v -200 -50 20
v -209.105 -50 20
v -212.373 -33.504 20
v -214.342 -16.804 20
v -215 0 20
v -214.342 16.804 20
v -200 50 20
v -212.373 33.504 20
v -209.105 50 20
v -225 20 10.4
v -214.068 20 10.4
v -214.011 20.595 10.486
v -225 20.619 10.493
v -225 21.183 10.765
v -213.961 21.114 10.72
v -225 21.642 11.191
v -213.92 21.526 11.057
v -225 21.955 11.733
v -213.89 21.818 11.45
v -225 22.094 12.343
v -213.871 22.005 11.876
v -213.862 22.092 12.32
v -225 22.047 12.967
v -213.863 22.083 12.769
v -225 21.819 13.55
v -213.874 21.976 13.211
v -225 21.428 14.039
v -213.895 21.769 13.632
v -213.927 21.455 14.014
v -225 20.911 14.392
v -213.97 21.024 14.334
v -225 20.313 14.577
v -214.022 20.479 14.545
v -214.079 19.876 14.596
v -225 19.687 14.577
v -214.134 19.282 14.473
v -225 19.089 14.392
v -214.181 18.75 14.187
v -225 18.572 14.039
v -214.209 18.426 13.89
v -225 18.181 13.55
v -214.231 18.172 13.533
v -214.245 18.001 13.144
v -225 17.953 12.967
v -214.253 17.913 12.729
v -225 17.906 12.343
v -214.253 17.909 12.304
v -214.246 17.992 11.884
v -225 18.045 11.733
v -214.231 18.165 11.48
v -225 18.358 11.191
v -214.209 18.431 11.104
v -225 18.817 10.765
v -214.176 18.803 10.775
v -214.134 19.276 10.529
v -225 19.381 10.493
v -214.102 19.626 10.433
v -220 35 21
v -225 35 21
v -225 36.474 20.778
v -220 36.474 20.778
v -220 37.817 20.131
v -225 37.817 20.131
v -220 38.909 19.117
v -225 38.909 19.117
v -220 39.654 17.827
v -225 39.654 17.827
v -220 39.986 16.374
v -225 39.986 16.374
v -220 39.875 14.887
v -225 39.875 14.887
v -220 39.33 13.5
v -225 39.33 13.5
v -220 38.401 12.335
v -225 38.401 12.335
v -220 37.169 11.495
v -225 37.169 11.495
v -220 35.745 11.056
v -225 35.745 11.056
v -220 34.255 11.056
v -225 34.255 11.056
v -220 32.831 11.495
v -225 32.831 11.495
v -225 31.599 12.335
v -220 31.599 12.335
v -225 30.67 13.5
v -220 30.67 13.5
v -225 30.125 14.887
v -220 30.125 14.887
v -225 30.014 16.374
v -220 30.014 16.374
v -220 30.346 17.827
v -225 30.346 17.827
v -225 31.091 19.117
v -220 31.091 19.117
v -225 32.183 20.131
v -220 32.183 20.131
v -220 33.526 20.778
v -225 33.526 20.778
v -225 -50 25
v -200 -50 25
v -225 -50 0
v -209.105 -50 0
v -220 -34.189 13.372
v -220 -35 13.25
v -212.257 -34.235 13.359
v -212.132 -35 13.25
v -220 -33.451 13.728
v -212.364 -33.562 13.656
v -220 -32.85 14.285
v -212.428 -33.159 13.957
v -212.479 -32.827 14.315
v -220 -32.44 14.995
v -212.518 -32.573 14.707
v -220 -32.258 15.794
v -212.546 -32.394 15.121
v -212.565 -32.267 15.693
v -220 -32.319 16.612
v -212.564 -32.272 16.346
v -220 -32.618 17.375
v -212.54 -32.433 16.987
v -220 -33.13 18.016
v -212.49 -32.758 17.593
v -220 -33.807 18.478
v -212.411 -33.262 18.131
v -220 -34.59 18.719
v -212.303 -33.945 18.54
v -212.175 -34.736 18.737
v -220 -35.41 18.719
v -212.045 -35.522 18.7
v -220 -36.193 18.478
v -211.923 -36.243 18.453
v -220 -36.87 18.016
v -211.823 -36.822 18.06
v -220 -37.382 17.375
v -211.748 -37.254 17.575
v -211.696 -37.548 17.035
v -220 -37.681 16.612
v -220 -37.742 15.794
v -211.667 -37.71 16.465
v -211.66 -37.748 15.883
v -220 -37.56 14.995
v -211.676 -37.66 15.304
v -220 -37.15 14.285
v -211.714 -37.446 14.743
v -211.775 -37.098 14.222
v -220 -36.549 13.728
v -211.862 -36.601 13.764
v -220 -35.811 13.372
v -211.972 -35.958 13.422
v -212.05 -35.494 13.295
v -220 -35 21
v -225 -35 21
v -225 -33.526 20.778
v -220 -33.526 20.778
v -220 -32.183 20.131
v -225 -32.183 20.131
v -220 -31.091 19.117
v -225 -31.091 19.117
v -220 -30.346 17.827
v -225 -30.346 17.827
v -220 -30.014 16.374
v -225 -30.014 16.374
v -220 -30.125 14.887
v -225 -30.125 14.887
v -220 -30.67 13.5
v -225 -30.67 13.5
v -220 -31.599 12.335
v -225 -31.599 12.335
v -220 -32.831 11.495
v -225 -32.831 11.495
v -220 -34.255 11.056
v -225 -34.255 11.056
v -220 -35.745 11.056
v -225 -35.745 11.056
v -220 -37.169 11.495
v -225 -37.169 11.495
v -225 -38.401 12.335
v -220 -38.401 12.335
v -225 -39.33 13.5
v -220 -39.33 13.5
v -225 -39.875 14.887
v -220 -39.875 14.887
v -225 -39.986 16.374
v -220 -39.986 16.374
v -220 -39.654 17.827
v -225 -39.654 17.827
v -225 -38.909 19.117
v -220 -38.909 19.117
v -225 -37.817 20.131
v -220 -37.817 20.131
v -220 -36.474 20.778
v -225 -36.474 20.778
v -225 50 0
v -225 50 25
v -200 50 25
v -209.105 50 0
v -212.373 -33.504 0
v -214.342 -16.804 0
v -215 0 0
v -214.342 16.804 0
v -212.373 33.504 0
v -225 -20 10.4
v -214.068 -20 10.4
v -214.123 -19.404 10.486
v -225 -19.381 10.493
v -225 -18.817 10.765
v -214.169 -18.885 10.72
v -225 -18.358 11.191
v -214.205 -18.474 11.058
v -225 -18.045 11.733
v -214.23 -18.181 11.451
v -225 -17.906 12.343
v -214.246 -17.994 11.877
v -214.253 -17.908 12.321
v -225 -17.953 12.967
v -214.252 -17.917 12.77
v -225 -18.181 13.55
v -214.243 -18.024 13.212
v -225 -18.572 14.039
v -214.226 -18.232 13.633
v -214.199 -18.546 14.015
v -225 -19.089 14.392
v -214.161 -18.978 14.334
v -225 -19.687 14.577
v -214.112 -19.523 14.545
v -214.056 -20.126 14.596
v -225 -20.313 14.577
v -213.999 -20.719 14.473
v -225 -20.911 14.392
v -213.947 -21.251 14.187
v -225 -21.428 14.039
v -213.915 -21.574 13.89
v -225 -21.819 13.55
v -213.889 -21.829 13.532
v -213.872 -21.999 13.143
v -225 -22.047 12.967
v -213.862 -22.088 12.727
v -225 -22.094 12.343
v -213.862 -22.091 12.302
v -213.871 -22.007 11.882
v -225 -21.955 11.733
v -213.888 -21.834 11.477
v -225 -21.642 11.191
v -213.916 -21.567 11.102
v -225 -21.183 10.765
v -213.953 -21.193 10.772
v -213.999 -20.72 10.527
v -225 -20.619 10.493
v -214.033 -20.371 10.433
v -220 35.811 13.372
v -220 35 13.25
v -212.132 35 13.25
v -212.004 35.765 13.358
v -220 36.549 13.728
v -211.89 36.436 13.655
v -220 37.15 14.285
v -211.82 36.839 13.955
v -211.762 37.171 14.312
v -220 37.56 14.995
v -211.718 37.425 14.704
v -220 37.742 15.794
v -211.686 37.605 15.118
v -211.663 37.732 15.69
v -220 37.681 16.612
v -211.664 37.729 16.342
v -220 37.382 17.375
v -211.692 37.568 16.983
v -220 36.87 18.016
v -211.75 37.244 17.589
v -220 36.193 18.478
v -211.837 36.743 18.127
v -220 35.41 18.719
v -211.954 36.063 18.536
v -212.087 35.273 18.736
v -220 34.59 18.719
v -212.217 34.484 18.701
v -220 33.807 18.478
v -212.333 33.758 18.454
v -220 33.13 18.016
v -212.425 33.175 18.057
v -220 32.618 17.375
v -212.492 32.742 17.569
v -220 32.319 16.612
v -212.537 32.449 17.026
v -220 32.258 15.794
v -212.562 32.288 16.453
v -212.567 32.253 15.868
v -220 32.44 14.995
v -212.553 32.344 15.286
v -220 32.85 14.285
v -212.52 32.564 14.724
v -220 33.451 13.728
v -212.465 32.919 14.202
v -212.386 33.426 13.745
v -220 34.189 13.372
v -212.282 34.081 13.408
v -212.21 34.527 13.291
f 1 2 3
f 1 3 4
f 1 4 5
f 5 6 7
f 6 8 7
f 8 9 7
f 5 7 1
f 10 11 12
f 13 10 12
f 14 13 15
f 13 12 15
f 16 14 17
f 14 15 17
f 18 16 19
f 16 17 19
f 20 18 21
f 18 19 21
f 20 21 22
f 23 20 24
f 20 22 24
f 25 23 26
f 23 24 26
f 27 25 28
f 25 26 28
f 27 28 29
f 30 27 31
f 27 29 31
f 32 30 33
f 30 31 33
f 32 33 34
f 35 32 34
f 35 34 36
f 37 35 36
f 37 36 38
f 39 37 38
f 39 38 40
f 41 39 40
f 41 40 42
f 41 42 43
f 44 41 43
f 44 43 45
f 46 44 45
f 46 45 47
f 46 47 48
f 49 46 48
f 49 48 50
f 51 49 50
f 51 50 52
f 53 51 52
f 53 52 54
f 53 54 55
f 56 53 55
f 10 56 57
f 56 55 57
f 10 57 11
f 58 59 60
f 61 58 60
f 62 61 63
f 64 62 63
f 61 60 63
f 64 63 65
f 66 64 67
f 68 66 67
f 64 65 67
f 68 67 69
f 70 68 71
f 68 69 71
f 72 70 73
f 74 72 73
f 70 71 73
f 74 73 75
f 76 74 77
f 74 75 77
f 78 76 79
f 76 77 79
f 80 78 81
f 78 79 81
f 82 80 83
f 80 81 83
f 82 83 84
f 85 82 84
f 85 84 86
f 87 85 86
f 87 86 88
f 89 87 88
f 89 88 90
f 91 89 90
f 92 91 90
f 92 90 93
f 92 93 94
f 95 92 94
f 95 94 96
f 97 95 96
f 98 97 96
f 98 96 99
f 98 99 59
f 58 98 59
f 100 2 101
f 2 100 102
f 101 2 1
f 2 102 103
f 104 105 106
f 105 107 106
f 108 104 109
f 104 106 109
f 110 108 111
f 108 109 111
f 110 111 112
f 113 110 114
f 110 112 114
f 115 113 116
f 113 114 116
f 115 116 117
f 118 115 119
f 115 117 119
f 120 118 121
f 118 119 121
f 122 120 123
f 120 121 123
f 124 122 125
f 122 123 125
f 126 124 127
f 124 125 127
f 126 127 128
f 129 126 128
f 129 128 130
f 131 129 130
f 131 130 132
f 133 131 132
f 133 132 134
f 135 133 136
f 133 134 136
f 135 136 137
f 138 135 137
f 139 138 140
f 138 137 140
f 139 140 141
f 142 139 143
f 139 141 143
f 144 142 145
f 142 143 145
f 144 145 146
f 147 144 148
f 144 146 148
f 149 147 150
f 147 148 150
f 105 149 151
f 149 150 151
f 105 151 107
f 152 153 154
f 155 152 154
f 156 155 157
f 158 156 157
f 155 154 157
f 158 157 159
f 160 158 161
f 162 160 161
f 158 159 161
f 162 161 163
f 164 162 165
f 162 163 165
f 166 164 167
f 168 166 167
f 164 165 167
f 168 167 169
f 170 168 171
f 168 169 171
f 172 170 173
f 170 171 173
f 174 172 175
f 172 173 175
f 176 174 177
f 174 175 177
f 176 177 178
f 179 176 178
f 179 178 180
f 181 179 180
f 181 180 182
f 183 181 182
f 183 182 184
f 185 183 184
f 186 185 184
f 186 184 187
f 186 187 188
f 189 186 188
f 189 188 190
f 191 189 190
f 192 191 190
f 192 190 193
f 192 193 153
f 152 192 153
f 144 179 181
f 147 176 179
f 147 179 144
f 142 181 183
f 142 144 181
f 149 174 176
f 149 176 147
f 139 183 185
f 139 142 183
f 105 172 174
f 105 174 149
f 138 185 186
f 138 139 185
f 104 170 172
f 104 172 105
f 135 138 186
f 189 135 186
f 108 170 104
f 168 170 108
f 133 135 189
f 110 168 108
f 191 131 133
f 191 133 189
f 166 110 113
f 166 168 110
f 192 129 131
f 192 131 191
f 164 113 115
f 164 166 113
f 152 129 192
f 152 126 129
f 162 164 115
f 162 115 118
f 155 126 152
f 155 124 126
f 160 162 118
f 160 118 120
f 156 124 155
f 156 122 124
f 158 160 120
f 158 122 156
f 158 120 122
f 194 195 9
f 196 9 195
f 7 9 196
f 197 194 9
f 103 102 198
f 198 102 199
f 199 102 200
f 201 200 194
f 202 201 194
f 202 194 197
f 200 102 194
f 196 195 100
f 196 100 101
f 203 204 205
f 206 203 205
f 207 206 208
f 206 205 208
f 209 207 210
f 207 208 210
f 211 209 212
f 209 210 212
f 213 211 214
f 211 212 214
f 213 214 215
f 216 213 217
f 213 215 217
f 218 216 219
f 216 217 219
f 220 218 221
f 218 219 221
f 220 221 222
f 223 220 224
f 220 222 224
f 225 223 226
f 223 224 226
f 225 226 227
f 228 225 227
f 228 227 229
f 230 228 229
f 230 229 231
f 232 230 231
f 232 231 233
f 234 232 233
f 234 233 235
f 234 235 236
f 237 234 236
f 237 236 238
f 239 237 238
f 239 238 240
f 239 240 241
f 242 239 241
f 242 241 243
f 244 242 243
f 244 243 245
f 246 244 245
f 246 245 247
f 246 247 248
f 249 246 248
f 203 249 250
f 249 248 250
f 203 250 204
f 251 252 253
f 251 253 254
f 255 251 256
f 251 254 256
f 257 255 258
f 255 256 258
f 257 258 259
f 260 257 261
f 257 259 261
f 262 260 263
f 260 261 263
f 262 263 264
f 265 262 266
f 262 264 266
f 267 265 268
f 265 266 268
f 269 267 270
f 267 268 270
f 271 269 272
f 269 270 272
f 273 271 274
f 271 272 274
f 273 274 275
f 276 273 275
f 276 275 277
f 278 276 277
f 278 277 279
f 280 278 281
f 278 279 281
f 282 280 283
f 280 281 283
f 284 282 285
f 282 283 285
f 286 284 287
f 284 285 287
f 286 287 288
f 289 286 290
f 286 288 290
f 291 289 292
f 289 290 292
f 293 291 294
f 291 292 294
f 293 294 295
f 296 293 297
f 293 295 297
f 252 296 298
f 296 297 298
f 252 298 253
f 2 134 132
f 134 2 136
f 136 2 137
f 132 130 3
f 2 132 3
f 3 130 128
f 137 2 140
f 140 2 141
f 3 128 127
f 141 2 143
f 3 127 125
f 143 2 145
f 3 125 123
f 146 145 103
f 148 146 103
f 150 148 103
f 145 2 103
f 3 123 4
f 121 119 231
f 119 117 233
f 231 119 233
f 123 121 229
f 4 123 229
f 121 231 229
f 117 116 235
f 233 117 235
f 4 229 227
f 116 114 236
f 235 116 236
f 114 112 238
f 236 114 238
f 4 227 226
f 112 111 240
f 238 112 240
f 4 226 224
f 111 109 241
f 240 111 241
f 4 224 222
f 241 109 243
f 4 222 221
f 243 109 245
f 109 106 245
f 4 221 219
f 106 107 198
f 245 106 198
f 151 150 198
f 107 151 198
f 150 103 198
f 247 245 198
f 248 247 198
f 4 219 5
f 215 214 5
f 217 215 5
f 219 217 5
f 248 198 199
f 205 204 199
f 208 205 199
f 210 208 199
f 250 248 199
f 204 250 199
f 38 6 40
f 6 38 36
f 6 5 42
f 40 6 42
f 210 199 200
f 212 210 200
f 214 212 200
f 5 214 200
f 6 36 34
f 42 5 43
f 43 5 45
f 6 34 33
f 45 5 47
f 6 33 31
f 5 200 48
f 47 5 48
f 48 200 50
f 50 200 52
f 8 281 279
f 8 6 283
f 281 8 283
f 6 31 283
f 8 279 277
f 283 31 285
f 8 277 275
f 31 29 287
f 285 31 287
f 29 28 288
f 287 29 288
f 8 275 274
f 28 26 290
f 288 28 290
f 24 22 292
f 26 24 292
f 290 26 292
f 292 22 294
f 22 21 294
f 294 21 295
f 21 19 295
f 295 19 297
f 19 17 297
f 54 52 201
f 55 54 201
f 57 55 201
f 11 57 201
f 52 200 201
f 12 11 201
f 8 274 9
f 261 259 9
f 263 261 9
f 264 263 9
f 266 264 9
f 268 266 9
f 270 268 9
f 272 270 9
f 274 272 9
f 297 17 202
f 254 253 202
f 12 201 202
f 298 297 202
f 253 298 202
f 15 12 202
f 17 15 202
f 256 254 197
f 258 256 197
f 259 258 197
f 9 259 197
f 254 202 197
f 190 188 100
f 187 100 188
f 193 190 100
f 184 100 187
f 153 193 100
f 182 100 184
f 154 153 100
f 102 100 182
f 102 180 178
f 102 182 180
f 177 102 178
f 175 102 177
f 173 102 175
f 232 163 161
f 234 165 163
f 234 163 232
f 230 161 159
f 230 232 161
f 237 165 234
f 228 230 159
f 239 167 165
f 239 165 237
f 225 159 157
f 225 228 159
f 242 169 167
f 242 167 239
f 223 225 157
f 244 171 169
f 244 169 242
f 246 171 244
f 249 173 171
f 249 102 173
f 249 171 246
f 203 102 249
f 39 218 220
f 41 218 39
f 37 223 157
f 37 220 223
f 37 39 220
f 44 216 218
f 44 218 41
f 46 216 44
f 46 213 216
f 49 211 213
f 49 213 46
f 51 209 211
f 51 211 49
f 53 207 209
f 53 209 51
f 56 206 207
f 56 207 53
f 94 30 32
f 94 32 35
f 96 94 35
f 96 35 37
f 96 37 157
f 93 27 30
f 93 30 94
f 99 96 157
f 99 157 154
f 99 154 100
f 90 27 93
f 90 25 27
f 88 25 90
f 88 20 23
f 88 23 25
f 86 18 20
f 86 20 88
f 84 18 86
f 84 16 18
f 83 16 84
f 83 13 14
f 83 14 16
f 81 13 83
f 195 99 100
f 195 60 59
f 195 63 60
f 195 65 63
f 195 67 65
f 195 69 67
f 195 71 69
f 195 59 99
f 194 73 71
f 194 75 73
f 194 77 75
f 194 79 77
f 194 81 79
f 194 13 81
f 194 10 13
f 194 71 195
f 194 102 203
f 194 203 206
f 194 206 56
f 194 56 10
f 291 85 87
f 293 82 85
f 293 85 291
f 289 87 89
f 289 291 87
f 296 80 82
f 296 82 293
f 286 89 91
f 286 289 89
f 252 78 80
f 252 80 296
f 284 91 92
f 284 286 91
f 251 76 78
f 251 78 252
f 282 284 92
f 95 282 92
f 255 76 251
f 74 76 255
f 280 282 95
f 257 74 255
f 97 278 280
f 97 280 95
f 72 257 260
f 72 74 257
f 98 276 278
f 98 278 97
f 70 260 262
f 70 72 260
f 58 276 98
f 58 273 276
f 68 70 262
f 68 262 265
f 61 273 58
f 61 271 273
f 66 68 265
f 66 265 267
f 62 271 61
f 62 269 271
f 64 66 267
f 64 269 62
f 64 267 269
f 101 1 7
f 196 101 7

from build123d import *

# Parameters (mm, degrees)
BOSS_EXTRU_1_DEPTH                                 = 20
ESQUISSE9_W                                        = 25
ESQUISSE9_H                                        = 100
BOSS_EXTRU_2_DEPTH                                 = 5
CHAMBRAGE_POUR_VIS_T_TE_HEXAGONALE_M53_D           = 5.5
CHAMBRAGE_POUR_VIS_T_TE_HEXAGONALE_M53_CBORE_D     = 10
CHAMBRAGE_POUR_VIS_T_TE_HEXAGONALE_M53_CBORE_DEPTH = 5
CHAMBRAGE_POUR_VIS_T_TE_HEXAGONALE_M54_D           = 5.5
CHAMBRAGE_POUR_VIS_T_TE_HEXAGONALE_M54_CBORE_D     = 10
CHAMBRAGE_POUR_VIS_T_TE_HEXAGONALE_M54_CBORE_DEPTH = 5
TROU_TARAUD_M52_D                                  = 4.2


with BuildPart() as part:
    # Esquisse1 → Boss.-Extru.1 (new body)
    with BuildSketch(Plane.XY):
        with BuildLine():
            Line((-225, 50), (-225, -50))
            Line((-225, -50), (-209.105236663, -50))
            ThreePointArc((-209.105236663, -50), (-215, 0), (-209.105236663, 50))
            Line((-209.105236663, 50), (-225, 50))
        make_face()
    extrude(amount=BOSS_EXTRU_1_DEPTH)

    # Esquisse9 → Boss.-Extru.2 (add)
    with BuildSketch(Plane.XY.offset(20)):
        with Locations((-212.5, 0)):
            Rectangle(ESQUISSE9_W, ESQUISSE9_H)
    extrude(amount=BOSS_EXTRU_2_DEPTH)

    # Chambrage pour vis à tête hexagonale M53 (through all)
    with Locations(Plane.ZY.offset(225)):
        with Locations((16, 35)):
            CounterBoreHole(CHAMBRAGE_POUR_VIS_T_TE_HEXAGONALE_M53_D / 2, CHAMBRAGE_POUR_VIS_T_TE_HEXAGONALE_M53_CBORE_D / 2, CHAMBRAGE_POUR_VIS_T_TE_HEXAGONALE_M53_CBORE_DEPTH)

    # Chambrage pour vis à tête hexagonale M54 (through all)
    with Locations(Plane.ZY.offset(225)):
        with Locations((16, -35)):
            CounterBoreHole(CHAMBRAGE_POUR_VIS_T_TE_HEXAGONALE_M54_D / 2, CHAMBRAGE_POUR_VIS_T_TE_HEXAGONALE_M54_CBORE_D / 2, CHAMBRAGE_POUR_VIS_T_TE_HEXAGONALE_M54_CBORE_DEPTH)

    # Trou taraudé M52 (through all)
    with Locations(Plane.ZY.offset(225)):
        with Locations((12.5, 20), (12.5, -20)):
            Hole(TROU_TARAUD_M52_D / 2)


solid = part.part
